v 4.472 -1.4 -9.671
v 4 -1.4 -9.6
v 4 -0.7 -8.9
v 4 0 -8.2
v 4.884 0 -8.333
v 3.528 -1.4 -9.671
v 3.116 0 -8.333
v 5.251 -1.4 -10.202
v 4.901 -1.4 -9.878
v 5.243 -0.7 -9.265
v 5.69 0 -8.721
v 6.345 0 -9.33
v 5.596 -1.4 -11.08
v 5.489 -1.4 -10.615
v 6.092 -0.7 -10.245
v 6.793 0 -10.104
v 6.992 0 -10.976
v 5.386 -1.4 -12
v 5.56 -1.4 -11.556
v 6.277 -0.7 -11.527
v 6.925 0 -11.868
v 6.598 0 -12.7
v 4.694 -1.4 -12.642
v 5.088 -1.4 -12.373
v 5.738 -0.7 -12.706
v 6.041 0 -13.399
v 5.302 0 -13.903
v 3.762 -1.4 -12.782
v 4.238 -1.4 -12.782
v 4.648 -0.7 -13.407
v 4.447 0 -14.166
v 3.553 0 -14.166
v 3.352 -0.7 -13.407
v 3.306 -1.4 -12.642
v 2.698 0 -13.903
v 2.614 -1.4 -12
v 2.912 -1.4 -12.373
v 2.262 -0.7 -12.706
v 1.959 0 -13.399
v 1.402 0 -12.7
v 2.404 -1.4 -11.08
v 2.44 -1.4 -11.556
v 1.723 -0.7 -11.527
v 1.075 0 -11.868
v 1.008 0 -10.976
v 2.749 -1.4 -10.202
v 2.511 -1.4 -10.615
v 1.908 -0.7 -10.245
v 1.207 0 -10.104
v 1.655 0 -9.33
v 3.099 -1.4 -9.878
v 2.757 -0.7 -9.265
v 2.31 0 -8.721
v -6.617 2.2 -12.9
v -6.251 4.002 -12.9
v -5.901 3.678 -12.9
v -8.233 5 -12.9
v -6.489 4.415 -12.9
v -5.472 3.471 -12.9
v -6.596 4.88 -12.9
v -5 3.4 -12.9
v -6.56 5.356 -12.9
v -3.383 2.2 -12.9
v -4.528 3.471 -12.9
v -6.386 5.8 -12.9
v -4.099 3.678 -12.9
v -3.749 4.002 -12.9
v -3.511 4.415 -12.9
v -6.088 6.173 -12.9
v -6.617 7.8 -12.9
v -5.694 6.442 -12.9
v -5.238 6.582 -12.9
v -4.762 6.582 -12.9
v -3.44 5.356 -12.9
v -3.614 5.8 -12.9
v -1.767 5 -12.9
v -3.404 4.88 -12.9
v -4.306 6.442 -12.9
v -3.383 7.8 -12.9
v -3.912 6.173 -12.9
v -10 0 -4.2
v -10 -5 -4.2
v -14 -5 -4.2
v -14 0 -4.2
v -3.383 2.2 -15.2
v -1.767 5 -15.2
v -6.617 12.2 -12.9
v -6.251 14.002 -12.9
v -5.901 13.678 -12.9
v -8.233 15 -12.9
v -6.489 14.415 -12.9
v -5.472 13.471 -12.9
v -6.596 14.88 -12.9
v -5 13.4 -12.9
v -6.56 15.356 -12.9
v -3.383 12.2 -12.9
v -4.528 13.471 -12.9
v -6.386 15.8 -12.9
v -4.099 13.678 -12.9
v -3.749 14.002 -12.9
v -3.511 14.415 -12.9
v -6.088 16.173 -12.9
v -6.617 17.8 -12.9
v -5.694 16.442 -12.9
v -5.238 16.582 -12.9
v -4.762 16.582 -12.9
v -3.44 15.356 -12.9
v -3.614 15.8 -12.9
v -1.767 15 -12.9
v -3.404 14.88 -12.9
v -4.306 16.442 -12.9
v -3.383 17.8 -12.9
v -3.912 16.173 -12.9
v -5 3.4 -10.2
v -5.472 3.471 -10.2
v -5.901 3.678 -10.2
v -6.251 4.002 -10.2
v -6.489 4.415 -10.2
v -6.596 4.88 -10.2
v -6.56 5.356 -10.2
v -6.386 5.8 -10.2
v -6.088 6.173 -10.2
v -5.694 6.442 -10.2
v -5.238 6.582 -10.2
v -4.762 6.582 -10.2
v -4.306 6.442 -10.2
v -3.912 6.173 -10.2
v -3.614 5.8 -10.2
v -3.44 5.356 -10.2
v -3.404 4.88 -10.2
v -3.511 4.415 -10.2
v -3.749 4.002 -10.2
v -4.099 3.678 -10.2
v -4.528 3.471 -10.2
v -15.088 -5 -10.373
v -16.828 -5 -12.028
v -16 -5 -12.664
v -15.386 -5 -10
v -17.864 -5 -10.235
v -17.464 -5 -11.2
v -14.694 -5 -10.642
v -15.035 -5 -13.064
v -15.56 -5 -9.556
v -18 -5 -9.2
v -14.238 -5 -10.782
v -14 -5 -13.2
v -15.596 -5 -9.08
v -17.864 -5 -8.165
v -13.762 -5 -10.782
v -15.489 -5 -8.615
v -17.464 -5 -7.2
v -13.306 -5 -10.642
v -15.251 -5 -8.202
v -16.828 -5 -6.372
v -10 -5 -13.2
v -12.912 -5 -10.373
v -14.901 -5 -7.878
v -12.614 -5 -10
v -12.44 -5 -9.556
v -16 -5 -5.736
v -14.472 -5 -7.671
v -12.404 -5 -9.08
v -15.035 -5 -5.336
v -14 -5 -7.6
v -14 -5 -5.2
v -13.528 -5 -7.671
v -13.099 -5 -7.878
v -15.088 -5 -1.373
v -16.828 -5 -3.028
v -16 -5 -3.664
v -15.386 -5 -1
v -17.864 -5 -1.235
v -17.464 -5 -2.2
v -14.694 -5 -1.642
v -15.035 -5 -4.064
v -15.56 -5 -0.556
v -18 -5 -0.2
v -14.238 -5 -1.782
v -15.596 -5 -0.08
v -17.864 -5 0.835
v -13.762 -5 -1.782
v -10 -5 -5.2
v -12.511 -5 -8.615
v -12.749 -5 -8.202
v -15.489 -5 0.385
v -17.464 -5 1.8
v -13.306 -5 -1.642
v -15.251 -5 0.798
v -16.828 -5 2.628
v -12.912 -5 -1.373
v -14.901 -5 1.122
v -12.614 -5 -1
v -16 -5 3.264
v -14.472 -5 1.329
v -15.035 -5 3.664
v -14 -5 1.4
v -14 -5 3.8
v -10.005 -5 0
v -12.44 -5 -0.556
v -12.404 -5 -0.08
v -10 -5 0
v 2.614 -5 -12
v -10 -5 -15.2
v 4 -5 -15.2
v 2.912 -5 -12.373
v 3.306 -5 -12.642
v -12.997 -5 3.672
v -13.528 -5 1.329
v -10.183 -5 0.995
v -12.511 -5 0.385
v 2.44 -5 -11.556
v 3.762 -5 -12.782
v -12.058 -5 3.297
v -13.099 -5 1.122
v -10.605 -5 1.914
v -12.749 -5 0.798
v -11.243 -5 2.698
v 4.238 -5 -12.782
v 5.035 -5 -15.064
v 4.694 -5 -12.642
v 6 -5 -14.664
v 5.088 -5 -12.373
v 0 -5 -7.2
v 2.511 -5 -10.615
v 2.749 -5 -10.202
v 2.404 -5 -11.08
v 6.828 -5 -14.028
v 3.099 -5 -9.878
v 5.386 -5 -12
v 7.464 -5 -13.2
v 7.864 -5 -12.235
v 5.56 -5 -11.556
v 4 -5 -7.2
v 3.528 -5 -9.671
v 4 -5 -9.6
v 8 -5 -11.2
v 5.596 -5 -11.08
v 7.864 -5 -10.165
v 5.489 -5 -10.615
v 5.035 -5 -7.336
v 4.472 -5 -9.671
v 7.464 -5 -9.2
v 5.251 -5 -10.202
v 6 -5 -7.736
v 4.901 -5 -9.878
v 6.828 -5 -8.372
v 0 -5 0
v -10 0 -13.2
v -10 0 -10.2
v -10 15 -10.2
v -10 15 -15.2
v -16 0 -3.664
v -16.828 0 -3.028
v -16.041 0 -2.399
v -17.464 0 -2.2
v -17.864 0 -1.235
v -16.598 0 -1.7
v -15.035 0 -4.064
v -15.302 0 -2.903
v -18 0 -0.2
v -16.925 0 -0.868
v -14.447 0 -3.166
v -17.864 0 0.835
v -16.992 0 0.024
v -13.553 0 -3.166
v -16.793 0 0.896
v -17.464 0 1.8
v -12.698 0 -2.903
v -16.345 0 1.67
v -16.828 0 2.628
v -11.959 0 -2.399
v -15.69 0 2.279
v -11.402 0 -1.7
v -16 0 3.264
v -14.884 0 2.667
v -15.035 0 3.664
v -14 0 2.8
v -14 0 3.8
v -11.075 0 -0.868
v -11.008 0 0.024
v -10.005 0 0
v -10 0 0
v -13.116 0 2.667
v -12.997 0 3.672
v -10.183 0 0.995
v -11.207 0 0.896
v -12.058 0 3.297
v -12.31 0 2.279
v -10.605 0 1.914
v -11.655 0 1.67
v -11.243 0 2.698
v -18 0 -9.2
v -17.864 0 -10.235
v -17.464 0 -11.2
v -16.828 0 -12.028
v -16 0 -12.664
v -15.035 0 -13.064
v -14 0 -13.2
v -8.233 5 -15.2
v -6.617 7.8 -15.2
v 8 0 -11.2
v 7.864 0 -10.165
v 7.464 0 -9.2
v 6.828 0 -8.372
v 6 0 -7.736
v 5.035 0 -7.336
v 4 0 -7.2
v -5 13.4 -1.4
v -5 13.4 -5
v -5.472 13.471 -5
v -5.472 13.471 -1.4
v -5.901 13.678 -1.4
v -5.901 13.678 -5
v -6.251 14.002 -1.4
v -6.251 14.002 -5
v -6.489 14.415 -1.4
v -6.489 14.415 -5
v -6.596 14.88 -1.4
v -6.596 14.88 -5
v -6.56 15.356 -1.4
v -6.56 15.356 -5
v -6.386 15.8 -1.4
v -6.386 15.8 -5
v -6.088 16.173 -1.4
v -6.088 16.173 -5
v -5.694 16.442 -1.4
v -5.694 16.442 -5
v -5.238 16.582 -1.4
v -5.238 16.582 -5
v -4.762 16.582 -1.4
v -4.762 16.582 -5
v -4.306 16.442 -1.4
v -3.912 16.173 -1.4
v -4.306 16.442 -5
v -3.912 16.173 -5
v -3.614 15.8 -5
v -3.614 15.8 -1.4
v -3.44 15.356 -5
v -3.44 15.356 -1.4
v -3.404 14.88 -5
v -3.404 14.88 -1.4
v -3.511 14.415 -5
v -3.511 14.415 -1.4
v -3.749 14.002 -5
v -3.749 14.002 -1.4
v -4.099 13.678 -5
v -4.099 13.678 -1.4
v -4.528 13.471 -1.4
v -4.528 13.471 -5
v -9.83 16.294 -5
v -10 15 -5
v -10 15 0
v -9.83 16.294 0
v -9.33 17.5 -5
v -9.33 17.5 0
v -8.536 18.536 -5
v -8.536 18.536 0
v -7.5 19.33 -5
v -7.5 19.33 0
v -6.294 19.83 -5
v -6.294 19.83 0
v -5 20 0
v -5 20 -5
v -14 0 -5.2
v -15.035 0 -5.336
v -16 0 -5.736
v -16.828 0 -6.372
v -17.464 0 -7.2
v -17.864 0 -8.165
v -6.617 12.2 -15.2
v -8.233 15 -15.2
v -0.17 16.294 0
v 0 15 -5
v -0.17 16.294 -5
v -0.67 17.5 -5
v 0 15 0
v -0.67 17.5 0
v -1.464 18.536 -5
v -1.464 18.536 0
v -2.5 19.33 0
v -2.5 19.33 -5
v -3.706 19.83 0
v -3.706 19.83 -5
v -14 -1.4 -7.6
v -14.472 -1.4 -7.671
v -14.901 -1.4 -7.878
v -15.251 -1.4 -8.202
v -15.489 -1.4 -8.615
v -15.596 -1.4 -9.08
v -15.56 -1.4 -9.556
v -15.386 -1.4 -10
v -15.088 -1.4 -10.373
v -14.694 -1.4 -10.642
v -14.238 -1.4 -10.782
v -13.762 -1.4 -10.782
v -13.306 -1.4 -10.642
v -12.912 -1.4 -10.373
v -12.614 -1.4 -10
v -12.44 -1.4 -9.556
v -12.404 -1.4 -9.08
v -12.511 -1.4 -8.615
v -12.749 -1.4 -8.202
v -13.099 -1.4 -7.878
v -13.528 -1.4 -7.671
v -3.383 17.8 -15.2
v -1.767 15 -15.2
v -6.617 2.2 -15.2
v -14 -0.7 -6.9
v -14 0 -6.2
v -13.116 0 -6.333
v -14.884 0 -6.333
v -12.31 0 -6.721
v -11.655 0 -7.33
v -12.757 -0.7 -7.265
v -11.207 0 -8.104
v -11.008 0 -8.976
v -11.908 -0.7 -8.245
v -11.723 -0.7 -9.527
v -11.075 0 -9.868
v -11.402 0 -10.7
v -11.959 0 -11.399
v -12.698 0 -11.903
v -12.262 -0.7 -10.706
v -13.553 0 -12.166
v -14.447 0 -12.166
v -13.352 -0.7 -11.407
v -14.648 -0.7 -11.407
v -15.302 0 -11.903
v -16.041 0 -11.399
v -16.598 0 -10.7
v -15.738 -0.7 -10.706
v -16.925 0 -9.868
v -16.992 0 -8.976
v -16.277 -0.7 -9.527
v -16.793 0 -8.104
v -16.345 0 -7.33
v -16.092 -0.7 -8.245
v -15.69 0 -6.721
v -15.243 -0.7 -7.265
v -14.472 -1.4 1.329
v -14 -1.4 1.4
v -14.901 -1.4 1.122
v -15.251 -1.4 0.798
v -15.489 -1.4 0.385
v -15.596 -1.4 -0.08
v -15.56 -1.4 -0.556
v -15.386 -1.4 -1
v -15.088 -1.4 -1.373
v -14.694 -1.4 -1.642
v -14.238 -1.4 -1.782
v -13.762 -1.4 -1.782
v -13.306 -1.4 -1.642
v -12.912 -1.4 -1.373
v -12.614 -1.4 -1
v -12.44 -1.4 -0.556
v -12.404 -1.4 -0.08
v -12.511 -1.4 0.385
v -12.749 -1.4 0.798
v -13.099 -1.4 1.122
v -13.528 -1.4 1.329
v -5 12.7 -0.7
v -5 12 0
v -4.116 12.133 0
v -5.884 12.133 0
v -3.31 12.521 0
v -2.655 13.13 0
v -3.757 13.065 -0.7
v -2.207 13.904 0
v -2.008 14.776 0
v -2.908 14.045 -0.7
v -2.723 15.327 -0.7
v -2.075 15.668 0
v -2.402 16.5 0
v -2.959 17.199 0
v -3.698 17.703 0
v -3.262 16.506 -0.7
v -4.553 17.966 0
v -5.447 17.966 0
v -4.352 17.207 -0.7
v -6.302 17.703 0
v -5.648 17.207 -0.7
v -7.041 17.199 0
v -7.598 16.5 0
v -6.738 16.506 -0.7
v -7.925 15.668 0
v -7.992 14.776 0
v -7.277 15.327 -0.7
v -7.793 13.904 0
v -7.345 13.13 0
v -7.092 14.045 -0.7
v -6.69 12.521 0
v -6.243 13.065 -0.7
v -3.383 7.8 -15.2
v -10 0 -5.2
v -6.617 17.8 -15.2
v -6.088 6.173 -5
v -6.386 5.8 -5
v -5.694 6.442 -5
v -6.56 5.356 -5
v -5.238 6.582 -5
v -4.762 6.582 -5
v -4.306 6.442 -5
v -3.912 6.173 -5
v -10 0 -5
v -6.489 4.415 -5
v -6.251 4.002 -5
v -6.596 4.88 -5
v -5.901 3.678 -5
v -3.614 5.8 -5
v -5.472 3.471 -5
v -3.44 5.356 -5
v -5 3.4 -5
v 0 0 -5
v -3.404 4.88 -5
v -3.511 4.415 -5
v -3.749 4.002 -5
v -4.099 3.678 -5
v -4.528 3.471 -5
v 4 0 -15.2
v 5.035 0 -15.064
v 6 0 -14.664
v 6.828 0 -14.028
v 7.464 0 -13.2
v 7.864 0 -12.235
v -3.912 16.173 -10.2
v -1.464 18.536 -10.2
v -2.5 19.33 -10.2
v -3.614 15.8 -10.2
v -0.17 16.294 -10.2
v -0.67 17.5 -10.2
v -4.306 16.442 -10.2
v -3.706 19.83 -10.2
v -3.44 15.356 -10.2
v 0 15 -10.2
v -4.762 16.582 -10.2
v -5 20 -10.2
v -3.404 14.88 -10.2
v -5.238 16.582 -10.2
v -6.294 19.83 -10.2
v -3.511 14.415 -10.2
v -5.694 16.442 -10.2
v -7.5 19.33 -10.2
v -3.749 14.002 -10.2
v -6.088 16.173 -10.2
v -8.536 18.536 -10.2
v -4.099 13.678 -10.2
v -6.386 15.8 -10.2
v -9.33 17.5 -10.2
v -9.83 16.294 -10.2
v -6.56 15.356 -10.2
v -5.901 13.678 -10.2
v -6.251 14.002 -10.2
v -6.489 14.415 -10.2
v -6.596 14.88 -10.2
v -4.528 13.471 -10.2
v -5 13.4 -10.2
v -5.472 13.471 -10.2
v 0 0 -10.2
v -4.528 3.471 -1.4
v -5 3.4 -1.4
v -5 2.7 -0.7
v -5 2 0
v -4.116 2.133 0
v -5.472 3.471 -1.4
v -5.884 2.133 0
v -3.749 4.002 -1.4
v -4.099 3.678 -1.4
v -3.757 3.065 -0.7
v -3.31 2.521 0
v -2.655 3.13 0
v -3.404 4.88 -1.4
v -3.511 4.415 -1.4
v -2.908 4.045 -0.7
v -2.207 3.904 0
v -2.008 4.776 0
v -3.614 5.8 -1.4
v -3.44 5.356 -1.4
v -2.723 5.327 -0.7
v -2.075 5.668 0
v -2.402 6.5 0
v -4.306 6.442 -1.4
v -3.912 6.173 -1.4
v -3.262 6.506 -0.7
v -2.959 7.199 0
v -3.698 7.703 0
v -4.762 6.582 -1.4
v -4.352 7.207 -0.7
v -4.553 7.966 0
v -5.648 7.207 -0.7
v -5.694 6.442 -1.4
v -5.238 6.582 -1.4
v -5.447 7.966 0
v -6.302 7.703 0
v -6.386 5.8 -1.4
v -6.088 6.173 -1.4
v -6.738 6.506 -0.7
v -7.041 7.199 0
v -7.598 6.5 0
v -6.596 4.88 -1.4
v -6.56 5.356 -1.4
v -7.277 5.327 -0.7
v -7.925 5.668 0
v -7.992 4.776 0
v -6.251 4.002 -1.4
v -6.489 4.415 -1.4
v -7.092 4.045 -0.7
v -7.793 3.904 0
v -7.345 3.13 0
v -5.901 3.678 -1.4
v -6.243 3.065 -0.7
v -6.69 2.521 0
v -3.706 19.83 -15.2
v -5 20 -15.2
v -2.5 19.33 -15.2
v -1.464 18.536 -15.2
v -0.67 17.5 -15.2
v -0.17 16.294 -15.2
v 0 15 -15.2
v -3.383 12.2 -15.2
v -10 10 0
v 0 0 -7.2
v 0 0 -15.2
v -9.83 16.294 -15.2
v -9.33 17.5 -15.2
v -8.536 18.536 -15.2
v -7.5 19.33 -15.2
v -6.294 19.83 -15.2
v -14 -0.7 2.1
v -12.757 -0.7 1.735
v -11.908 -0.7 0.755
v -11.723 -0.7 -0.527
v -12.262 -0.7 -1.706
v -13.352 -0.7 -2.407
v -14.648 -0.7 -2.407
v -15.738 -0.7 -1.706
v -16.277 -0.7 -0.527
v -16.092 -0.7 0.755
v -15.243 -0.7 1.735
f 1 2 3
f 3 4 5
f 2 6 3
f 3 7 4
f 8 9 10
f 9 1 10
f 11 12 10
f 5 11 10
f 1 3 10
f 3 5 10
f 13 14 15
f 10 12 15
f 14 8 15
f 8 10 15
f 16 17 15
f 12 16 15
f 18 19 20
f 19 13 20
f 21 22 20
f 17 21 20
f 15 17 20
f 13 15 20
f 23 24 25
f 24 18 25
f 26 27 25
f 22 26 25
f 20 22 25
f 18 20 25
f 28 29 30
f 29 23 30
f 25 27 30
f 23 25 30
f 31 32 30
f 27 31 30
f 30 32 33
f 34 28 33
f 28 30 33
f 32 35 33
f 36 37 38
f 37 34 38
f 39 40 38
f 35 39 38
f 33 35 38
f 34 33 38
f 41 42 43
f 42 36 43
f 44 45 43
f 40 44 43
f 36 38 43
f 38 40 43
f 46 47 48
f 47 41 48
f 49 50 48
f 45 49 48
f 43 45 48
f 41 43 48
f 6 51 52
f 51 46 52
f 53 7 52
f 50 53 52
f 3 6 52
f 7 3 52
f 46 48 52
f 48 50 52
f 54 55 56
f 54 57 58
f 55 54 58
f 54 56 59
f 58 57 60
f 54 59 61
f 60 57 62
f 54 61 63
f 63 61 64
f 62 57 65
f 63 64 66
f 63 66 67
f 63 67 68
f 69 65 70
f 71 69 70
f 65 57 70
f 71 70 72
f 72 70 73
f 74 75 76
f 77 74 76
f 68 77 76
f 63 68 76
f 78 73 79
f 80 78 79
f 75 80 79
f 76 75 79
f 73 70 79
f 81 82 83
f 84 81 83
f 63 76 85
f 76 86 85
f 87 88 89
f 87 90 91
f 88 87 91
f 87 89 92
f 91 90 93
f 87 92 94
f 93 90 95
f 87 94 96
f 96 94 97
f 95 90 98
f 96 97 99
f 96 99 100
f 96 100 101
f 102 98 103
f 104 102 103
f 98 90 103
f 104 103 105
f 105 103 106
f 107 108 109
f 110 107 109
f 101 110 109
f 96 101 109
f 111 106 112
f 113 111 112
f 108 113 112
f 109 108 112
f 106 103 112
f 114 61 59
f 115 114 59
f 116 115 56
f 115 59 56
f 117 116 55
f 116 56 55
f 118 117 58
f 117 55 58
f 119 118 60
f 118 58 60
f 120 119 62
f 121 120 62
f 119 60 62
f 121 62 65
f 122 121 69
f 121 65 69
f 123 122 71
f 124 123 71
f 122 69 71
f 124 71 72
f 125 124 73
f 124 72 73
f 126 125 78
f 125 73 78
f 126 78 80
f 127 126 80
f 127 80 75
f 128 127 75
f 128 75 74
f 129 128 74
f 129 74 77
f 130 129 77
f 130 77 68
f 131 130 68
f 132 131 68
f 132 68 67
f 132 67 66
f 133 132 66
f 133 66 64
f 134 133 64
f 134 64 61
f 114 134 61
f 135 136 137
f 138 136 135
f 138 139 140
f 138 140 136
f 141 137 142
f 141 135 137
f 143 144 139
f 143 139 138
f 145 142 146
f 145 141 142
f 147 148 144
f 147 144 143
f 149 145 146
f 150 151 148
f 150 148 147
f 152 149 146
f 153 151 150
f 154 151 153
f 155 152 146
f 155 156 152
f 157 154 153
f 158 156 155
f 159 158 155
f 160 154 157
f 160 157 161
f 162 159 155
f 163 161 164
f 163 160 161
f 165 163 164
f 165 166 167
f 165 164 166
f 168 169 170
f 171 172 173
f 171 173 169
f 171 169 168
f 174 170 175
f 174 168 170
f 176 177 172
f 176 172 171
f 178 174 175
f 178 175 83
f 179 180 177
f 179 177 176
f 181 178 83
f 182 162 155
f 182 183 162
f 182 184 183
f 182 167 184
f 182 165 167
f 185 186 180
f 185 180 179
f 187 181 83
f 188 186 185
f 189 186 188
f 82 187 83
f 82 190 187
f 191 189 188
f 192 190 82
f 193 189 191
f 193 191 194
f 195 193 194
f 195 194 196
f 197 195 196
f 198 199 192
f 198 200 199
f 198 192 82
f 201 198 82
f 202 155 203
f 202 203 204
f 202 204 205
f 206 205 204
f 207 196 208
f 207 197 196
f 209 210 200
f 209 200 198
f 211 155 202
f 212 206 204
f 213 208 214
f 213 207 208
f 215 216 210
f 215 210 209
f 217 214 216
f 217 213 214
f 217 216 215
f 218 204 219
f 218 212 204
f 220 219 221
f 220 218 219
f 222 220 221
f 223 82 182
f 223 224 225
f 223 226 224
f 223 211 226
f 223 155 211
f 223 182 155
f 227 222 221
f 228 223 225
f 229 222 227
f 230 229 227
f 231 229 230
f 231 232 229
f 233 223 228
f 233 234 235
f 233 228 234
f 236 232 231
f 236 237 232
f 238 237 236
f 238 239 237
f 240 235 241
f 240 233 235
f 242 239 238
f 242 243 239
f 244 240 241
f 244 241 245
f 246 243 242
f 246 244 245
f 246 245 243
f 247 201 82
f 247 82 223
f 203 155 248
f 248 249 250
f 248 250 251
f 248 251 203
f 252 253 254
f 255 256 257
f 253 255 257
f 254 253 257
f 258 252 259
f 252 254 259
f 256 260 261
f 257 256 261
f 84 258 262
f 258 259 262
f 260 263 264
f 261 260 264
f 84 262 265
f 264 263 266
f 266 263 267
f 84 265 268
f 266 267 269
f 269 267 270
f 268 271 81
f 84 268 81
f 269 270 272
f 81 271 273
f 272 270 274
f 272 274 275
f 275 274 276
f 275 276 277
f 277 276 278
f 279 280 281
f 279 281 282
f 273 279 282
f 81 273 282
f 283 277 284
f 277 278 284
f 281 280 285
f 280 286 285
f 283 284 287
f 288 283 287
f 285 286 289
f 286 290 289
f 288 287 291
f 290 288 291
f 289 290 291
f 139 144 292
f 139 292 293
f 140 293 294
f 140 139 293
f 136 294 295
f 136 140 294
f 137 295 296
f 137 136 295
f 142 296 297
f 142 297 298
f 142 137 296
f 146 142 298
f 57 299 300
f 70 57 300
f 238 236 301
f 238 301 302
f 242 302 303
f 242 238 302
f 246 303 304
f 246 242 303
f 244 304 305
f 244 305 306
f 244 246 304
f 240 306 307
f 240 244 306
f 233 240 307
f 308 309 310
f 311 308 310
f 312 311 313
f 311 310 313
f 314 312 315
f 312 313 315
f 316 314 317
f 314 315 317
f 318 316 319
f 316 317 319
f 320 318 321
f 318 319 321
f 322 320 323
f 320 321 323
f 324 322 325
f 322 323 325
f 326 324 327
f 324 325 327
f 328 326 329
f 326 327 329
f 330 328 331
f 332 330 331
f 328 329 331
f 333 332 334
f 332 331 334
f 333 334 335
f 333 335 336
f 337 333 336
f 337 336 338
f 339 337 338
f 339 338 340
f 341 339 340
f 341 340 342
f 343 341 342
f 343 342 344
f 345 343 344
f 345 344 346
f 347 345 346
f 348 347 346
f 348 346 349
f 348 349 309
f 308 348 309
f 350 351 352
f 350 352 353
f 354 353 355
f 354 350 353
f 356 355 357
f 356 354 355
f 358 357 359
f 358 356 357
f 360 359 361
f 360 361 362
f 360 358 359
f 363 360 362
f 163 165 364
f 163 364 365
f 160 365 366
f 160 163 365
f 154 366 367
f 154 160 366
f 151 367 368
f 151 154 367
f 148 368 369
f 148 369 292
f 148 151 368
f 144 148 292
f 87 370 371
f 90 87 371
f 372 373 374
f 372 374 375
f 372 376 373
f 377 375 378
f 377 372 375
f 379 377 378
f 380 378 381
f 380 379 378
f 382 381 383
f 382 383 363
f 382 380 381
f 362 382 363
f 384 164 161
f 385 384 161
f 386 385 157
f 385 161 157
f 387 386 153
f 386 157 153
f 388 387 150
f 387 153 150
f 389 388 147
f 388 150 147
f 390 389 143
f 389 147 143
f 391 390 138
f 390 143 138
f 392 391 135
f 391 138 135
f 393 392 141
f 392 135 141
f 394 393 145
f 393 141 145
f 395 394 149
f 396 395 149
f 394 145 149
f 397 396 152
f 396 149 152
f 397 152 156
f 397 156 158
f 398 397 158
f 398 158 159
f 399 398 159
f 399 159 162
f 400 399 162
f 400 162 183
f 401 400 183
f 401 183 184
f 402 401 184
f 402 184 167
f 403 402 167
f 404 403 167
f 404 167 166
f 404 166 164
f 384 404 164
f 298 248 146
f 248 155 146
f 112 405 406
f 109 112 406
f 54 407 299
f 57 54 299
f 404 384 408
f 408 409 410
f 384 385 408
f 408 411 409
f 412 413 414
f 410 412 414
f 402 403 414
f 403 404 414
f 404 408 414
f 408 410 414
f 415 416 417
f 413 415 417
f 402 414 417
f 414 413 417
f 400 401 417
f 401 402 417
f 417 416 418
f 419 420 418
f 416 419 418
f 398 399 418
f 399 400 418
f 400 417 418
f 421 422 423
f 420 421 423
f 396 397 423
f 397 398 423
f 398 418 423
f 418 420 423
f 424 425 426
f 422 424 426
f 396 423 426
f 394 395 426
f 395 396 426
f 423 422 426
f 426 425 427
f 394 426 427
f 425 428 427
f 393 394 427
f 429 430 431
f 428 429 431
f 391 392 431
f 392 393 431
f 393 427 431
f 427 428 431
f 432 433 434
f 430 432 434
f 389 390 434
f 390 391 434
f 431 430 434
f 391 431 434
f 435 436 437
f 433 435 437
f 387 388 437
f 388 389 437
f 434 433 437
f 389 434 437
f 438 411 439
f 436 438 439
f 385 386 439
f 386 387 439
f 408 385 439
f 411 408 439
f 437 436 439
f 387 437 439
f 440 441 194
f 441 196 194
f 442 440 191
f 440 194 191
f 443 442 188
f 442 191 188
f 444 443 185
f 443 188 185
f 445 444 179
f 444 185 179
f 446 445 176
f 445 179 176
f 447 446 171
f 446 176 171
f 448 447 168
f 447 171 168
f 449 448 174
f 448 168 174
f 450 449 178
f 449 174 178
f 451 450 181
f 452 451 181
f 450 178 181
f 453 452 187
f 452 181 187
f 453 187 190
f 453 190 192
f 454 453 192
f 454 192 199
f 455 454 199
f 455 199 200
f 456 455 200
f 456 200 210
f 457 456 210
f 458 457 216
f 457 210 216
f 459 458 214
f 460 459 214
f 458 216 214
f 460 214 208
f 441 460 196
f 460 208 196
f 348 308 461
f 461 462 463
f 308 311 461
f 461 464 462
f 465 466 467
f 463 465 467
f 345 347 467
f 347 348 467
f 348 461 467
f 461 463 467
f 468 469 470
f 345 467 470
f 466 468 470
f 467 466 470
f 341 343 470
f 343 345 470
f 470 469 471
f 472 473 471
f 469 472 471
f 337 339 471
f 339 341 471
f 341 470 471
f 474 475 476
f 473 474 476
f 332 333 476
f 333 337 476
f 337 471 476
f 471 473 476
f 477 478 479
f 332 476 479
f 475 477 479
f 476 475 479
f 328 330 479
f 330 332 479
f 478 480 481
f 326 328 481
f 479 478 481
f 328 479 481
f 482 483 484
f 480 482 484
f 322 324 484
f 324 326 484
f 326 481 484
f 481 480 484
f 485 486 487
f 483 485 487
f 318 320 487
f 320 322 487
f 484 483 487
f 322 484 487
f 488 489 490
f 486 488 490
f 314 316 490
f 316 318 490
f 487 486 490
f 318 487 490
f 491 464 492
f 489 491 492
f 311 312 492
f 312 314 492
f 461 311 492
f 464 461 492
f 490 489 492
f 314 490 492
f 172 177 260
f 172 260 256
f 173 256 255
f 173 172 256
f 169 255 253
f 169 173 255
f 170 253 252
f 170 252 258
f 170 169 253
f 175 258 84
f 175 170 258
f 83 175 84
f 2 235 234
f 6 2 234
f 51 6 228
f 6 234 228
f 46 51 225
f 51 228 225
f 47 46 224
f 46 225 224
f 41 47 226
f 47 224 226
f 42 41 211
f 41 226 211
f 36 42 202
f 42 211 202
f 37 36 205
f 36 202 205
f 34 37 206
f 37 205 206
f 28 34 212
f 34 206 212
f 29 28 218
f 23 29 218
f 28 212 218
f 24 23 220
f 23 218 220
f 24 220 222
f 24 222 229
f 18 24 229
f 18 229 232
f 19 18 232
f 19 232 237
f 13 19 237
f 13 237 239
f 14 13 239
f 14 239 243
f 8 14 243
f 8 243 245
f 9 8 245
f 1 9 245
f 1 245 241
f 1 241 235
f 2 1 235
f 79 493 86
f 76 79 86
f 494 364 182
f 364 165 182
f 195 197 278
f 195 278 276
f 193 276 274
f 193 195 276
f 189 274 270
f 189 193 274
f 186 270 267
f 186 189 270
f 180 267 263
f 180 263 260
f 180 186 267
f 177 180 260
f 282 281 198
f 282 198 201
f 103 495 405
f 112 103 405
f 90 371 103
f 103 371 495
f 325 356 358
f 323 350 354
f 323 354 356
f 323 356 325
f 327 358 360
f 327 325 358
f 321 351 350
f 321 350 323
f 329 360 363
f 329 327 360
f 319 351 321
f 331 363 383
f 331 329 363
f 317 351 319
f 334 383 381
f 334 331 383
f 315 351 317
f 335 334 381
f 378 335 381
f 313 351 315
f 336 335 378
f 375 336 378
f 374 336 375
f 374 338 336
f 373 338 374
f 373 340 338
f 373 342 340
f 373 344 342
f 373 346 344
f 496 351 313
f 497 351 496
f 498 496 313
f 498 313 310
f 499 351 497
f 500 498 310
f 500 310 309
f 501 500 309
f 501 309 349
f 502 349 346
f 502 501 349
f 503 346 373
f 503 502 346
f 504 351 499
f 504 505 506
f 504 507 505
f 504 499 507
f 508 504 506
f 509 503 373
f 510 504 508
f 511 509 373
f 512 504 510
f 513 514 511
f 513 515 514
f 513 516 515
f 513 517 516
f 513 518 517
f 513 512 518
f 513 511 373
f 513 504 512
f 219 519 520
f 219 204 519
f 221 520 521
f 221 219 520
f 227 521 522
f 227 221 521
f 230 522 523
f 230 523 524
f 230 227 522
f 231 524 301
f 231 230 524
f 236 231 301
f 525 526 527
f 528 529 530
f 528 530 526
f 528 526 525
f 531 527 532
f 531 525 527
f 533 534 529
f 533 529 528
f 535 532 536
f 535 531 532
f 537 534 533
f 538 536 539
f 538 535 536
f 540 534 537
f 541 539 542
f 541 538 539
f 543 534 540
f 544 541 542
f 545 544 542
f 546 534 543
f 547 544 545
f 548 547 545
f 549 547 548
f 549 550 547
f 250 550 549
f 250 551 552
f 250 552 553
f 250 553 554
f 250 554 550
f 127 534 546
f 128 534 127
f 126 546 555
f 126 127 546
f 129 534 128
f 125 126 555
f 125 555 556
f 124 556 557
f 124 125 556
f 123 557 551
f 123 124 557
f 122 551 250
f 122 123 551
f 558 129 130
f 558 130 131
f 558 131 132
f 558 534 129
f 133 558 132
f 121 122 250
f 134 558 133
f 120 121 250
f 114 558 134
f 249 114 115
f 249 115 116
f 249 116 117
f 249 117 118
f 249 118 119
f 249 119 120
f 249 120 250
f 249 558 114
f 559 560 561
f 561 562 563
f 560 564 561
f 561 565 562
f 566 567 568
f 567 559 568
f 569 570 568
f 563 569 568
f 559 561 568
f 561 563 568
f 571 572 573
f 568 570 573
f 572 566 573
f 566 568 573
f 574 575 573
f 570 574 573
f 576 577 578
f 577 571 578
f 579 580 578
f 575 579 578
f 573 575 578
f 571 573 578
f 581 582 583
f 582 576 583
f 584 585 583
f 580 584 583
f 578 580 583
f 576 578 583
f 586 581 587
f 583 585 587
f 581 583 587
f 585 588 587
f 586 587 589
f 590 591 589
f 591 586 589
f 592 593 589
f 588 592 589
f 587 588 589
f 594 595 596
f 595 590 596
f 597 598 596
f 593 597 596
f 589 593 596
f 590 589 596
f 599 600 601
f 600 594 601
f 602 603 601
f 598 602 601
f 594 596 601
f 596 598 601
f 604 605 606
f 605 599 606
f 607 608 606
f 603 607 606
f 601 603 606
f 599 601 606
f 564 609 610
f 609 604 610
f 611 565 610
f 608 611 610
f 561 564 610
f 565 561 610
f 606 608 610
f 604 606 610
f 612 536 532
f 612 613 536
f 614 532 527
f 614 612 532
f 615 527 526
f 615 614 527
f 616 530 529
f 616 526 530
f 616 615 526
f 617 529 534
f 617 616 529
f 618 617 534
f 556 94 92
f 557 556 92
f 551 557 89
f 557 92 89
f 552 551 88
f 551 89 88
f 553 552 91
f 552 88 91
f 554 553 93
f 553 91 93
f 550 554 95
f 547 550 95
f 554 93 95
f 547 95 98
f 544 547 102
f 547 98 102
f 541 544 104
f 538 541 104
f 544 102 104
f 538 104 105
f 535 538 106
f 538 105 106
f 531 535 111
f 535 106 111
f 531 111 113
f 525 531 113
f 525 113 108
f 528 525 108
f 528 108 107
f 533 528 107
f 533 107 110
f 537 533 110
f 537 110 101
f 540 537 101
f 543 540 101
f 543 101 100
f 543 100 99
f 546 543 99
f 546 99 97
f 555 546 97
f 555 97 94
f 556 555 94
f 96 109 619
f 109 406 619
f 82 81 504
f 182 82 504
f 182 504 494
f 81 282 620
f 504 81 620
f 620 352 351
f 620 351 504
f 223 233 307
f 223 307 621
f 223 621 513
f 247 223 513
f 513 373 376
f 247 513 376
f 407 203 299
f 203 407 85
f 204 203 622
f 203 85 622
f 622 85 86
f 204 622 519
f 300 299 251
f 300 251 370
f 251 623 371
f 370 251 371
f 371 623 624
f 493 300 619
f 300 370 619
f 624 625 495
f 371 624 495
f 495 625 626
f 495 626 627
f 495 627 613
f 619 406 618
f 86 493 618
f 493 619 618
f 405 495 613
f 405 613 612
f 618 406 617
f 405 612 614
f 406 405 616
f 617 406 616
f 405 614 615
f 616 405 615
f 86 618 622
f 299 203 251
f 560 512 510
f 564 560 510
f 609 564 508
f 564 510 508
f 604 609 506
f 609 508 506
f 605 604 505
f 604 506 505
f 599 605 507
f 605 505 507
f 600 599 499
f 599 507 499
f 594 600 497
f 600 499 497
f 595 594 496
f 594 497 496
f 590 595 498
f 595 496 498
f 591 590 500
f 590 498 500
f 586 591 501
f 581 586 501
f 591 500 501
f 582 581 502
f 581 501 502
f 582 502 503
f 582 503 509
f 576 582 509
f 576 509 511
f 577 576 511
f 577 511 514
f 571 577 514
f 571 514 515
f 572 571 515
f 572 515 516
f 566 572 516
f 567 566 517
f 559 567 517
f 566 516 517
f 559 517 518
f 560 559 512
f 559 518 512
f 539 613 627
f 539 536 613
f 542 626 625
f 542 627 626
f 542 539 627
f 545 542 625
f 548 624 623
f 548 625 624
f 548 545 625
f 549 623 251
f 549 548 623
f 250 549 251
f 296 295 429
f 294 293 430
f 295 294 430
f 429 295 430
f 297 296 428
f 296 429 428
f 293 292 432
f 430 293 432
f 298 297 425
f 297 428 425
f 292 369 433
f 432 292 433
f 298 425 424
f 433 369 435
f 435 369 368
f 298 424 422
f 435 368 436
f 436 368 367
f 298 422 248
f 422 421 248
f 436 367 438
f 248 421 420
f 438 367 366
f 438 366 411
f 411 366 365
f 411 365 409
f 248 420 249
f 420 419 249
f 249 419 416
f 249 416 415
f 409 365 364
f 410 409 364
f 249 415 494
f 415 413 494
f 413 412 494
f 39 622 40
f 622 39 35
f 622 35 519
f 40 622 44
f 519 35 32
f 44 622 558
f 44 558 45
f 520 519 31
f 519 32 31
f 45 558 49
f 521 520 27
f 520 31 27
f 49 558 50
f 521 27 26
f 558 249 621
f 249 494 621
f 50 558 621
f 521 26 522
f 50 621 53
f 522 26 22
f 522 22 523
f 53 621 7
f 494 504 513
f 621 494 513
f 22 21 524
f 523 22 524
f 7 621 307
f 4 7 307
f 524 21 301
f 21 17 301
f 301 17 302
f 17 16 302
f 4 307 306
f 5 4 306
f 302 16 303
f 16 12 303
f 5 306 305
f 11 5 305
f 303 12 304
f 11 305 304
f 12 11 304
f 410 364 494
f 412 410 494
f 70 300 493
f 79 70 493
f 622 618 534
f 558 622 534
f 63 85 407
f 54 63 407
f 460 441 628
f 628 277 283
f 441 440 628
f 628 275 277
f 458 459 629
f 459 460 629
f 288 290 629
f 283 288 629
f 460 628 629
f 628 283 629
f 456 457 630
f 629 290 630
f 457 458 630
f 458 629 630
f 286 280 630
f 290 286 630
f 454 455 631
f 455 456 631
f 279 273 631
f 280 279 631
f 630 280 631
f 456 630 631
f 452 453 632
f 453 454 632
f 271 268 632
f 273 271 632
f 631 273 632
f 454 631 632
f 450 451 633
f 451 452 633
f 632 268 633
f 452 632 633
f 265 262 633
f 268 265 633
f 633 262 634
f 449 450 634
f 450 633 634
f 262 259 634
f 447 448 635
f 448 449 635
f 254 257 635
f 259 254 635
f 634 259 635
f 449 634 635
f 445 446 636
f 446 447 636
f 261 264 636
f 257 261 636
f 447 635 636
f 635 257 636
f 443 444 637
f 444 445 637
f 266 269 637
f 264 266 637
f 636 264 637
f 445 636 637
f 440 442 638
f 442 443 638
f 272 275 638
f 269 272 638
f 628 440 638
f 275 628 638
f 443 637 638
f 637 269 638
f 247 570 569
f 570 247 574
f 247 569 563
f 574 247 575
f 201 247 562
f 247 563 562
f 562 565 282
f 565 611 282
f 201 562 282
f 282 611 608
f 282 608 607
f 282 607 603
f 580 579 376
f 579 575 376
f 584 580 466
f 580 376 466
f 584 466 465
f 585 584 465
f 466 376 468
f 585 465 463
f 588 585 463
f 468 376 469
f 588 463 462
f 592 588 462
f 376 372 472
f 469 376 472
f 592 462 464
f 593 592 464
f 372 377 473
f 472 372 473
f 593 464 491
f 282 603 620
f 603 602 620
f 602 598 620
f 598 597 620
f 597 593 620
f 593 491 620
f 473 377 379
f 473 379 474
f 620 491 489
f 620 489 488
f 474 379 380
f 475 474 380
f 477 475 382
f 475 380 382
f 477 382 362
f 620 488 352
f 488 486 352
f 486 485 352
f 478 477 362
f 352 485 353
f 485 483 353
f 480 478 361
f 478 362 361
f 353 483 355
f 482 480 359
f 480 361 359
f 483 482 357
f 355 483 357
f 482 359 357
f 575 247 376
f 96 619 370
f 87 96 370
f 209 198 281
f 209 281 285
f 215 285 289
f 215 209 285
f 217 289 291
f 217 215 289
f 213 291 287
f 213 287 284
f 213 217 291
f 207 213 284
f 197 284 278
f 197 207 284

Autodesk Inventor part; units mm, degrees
ref_plane "YZ Plane" through (0, 0, 0) normal (1, 0, 0) x (0, 1, 0)
sketch "Эскиз3" plane through (0, 0, 0) normal (0, 1, 0) x (-1, 0, 0)
  line L0 (0, 0) -> (10, 0)
  line L1 (10, 0) -> (10, -5)
  line L2 (10, -5) -> (0, -5)
  line L3 (0, -5) -> (0, 0)
  dimension "d6" = 10
  dimension "d7" = 5
extrude "Выдавливание2" add sketch "Эскиз3" along normal blind 20
fillet "Сопряжение1" radius 5 2 edges at (0, 20, -2.5) (-10, 20, -2.5)
ref_plane "РабПлоскость1" through (0, 0, -7.6) normal (0, 0, -1) x (-1, 0, 0)
mirror "Зеркальное отражение1" about plane through (0, 0, -7.6) normal (0, 0, -1)
ref_plane "РабПлоскость2" through (0, 0, -12.9) normal (0, 0, -1) x (-1, 0, 0)
sketch "Эскиз5" plane through (-10, 0, 0) normal (0, 0, 1) x (1, 0, 0)
  arc A0 (10, 15) -> (0, 15) centre (5, 15) ccw projected
  line L0 (5, 15) -> (5, 5)
  dimension "d23" = 10
hole "Отверстие1" at (-5, 15, 0) at (-5, 5, 0) direction (0, 0, -1) diameter 3.2 depth 12.9 countersink diameter 6 countersink angle 90
sketch "Эскиз6" plane through (-10, 0, -15.2) normal (0, 0, 1) x (1, 0, 0)
  circle A0 centre (5, 15) radius 1.6 projected
  circle A1 centre (5, 5) radius 1.6 projected
  line L0 (6.6166, 17.8) -> (8.2332, 15)
  line L1 (8.2332, 15) -> (6.6166, 12.2)
  line L2 (6.6166, 12.2) -> (3.3834, 12.2)
  line L3 (3.3834, 12.2) -> (1.7668, 15)
  line L4 (1.7668, 15) -> (3.3834, 17.8)
  line L5 (3.3834, 17.8) -> (6.6166, 17.8)
  line L6 (6.6166, 7.8) -> (8.2332, 5)
  line L7 (8.2332, 5) -> (6.6166, 2.2)
  line L8 (6.6166, 2.2) -> (3.3834, 2.2)
  line L9 (3.3834, 2.2) -> (1.7668, 5)
  line L10 (1.7668, 5) -> (3.3834, 7.8)
  line L11 (3.3834, 7.8) -> (6.6166, 7.8)
  point P0 (10, 0)
  dimension "d24" = 5.6
  dimension "d25" = 5.6
extrude "Выдавливание3" cut sketch "Эскиз6" along normal up to surface (2.3 mm away) contours A0 | A1 | L0 L1 L2 L3 L4 L5 | L6 L7 L8 L9 L10 L11
sketch "Эскиз9" plane through (-10, 0, -15.2) normal (0, -1, 0) x (1, 0, 0)
  line L0 (0, 5) -> (0, 0) projected
  line L1 (10, 15.2) -> (0, 15.2)
  line L2 (0, 15.2) -> (0, 0)
  line L3 (0, 0) -> (10, 0)
  line L4 (10, 0) -> (10, 15.2)
extrude "Выдавливание5" add sketch "Эскиз9" along normal blind 5
sketch "Эскиз11" plane through (-10, -5, -15.2) normal (0, -1, 0) x (1, 0, 0)
  line L0 (0, 15.2) -> (0, 0) projected
  line L1 (0, 0) -> (10, 0) projected
  line L2 (10, 0) -> (10, 15.2) projected
  line L3 (10, 15.2) -> (0, 15.2) projected
  line L4 (10, 0) -> (18, 0)
  line L5 (18, 0) -> (18, 8)
  line L6 (18, 8) -> (10, 8)
  line L7 (10, 8) -> (10, 0)
  line L8 (0, 0) -> (0, 2)
  line L9 (0, 5) -> (0, 0) projected
  line L10 (0, 2) -> (-8, 2)
  line L11 (-8, 2) -> (-8, 10)
  line L12 (-8, 10) -> (0, 10)
  line L13 (0, 10) -> (0, 2)
  line L14 (0, 10) -> (0, 11)
  line L15 (0, 10.2) -> (0, 15.2) projected
  line L16 (0, 11) -> (-8, 11)
  line L17 (-8, 11) -> (-8, 19)
  line L18 (-8, 19) -> (0, 19)
  line L19 (0, 19) -> (0, 11)
  point P0 (0, 2)
  dimension "d75" = 8
  dimension "d76" = 8
  dimension "d77" = 2
  dimension "d78" = 8
  dimension "d79" = 8
  dimension "d80" = 1
  dimension "d81" = 8
  dimension "d82" = 8
extrude "Выдавливание6" add sketch "Эскиз11" against normal blind 5 contours L0 L16 L17 L18 L19 | L6 L5 L4 L2 | L0 L10 L11 L12
sketch "Эскиз12" plane through (-10, 0, -15.2) normal (0, 1, 0) x (1, 0, 0)
  line L0 (10, -10.2) -> (0, -10.2) projected
  line L1 (10, -8) -> (10, -10.2) projected
  line L2 (10, -8) -> (18, -8) projected
  line L3 (18, -8) -> (18, 0) projected
  line L4 (18, 0) -> (10, 0) projected
  line L5 (10, -5) -> (10, 0) projected
  line L6 (10, -5) -> (0, -5) projected
  line L7 (0, -2) -> (0, -5) projected
  line L8 (0, -2) -> (-8, -2) projected
  line L9 (-8, -2) -> (-8, -10) projected
  line L10 (-8, -10) -> (0, -10) projected
  line L11 (0, -10.2) -> (0, -10) projected
  line L12 (0, -11) -> (-8, -11) projected
  line L13 (-8, -11) -> (-8, -19) projected
  line L14 (-8, -19) -> (0, -19) projected
  line L15 (0, -19) -> (0, -15.2) projected
  line L16 (0, -11) -> (0, -15.2) projected
  line L17 (0, -2) -> (-8, -2) projected
  line L18 (-4, -2) -> (-4, -10)
  line L19 (0, -11) -> (-8, -11) projected
  line L20 (-4, -11) -> (-4, -19)
  line L21 (18, 0) -> (10, 0) projected
  line L22 (14, 0) -> (14, -8)
  point P0 (10, -15.2)
  point P1 (14, -4)
  point P2 (-4, -6)
  point P3 (-4, -15)
hole "Отверстие4" at (-14, 0, -9.2) at (4, 0, -11.2) at (-14, 0, -0.2) direction (0, -1, 0) diameter 3.2 end through all countersink diameter 6 countersink angle 90
fillet "Сопряжение2" radius 4 7 edges at (8, -2.5, -15.2) (8, -2.5, -7.2) (-18, -2.5, -13.2) (-18, -2.5, -5.2) (-18, -2.5, -4.2) (-18, -2.5, 3.8) (-10, -2.5, 3.8)
equation "\"d25\" = d24"
properties part number "Крепление камеры к корпусу"
